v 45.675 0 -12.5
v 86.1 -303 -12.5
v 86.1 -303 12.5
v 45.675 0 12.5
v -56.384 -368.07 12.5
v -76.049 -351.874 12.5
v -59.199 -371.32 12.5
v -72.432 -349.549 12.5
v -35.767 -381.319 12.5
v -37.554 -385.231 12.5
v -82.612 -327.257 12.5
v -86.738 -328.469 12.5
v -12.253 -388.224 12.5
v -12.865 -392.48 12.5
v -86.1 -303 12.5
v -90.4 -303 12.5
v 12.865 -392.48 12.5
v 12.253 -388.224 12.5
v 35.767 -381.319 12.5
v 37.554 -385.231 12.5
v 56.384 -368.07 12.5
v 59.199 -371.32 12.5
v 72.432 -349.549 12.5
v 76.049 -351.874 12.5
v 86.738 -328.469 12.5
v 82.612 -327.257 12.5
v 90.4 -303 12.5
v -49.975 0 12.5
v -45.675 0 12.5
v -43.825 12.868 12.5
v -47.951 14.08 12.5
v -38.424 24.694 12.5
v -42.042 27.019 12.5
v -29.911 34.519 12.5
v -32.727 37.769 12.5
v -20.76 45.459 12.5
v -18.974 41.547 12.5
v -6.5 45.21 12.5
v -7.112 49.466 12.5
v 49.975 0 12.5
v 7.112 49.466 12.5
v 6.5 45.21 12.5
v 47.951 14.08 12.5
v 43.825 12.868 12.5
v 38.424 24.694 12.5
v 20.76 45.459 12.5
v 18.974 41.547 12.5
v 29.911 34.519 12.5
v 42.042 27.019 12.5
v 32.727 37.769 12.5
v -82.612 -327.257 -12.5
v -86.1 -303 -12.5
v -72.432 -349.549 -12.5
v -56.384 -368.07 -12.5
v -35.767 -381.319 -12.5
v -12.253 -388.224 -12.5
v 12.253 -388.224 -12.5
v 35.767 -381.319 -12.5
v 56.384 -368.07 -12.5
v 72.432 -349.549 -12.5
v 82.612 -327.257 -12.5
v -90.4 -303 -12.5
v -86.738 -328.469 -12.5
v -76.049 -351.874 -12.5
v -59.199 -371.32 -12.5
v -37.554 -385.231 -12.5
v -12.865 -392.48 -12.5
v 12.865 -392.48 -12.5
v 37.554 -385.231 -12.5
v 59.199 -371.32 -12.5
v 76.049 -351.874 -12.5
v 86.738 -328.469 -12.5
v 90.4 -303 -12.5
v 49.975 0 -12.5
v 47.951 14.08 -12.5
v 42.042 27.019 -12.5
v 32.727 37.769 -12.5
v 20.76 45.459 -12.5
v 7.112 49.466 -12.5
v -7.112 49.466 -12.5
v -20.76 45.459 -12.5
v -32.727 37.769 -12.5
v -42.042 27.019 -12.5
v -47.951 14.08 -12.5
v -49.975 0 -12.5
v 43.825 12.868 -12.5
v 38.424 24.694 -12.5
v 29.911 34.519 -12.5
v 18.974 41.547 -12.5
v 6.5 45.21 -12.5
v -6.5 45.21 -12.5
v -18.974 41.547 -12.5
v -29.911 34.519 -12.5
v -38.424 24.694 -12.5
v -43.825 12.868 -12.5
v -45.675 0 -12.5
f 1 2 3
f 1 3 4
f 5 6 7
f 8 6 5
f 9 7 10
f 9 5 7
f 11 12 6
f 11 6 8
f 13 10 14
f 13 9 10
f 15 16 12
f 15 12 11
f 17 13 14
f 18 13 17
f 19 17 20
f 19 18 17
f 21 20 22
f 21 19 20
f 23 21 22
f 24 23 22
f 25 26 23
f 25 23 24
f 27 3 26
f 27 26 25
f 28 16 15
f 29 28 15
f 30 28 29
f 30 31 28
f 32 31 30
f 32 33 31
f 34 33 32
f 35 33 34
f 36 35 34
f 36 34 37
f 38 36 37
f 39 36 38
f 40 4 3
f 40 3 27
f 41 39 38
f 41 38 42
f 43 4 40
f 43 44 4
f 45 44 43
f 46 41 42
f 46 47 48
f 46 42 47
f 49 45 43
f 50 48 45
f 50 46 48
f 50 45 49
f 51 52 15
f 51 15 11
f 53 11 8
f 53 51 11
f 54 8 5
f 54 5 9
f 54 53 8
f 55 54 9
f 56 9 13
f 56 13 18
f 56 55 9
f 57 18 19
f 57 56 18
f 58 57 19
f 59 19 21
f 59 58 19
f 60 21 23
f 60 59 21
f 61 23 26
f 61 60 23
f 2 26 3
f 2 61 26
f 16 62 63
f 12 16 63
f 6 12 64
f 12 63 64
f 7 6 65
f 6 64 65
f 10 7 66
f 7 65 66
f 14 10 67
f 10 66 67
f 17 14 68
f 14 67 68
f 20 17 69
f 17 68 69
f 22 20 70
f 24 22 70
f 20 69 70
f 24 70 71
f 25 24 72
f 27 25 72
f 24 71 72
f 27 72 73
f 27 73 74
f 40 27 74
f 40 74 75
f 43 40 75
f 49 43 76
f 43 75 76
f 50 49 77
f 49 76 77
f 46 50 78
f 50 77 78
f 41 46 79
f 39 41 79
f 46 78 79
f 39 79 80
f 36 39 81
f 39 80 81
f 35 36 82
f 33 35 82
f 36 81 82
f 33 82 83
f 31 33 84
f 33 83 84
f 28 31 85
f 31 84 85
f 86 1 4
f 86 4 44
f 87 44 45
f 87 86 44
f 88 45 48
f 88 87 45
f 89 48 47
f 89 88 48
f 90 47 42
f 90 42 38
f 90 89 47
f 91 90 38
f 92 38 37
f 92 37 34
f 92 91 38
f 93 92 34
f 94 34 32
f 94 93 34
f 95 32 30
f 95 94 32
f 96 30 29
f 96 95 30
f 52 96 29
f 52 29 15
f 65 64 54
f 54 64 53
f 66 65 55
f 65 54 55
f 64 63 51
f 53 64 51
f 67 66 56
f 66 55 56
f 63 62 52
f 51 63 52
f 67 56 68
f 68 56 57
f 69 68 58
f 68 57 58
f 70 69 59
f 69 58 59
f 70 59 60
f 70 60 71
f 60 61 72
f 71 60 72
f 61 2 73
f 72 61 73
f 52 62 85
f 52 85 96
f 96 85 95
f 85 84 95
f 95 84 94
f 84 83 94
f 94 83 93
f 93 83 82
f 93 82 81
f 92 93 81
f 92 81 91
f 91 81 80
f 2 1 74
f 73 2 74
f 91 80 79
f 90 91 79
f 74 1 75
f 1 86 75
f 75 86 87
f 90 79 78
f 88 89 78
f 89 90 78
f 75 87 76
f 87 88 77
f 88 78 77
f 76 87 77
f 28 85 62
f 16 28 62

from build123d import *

# Parameters (mm, degrees)
AUFSATZ_LINEAR_AUSTRAGEN1_DEPTH      = 12.5
AUFSATZ_LINEAR_AUSTRAGEN1_DEPTH_BACK = 12.5


with BuildPart() as part:
    # Skizze3 → Aufsatz-Linear austragen1 (new, two sides: drawn at the far end of the back side and taken through both)
    with BuildSketch(Plane.XY.offset(-AUFSATZ_LINEAR_AUSTRAGEN1_DEPTH_BACK)):
        with BuildLine():
            Line((-49.975, 0), (-90.4, -303))
            ThreePointArc((-90.4, -303), (0, -393.4), (90.4, -303))
            Line((90.4, -303), (49.975, 0))
            ThreePointArc((49.975, 0), (0, 49.975), (-49.975, 0))
        make_face()
        with BuildLine():
            Line((86.1, -303), (45.675, 0))
            ThreePointArc((45.675, 0), (0, 45.675), (-45.675, 0))
            Line((-45.675, 0), (-86.1, -303))
            ThreePointArc((-86.1, -303), (0, -389.1), (86.1, -303))
        make_face(mode=Mode.SUBTRACT)
    extrude(amount=AUFSATZ_LINEAR_AUSTRAGEN1_DEPTH + AUFSATZ_LINEAR_AUSTRAGEN1_DEPTH_BACK)


solid = part.part
